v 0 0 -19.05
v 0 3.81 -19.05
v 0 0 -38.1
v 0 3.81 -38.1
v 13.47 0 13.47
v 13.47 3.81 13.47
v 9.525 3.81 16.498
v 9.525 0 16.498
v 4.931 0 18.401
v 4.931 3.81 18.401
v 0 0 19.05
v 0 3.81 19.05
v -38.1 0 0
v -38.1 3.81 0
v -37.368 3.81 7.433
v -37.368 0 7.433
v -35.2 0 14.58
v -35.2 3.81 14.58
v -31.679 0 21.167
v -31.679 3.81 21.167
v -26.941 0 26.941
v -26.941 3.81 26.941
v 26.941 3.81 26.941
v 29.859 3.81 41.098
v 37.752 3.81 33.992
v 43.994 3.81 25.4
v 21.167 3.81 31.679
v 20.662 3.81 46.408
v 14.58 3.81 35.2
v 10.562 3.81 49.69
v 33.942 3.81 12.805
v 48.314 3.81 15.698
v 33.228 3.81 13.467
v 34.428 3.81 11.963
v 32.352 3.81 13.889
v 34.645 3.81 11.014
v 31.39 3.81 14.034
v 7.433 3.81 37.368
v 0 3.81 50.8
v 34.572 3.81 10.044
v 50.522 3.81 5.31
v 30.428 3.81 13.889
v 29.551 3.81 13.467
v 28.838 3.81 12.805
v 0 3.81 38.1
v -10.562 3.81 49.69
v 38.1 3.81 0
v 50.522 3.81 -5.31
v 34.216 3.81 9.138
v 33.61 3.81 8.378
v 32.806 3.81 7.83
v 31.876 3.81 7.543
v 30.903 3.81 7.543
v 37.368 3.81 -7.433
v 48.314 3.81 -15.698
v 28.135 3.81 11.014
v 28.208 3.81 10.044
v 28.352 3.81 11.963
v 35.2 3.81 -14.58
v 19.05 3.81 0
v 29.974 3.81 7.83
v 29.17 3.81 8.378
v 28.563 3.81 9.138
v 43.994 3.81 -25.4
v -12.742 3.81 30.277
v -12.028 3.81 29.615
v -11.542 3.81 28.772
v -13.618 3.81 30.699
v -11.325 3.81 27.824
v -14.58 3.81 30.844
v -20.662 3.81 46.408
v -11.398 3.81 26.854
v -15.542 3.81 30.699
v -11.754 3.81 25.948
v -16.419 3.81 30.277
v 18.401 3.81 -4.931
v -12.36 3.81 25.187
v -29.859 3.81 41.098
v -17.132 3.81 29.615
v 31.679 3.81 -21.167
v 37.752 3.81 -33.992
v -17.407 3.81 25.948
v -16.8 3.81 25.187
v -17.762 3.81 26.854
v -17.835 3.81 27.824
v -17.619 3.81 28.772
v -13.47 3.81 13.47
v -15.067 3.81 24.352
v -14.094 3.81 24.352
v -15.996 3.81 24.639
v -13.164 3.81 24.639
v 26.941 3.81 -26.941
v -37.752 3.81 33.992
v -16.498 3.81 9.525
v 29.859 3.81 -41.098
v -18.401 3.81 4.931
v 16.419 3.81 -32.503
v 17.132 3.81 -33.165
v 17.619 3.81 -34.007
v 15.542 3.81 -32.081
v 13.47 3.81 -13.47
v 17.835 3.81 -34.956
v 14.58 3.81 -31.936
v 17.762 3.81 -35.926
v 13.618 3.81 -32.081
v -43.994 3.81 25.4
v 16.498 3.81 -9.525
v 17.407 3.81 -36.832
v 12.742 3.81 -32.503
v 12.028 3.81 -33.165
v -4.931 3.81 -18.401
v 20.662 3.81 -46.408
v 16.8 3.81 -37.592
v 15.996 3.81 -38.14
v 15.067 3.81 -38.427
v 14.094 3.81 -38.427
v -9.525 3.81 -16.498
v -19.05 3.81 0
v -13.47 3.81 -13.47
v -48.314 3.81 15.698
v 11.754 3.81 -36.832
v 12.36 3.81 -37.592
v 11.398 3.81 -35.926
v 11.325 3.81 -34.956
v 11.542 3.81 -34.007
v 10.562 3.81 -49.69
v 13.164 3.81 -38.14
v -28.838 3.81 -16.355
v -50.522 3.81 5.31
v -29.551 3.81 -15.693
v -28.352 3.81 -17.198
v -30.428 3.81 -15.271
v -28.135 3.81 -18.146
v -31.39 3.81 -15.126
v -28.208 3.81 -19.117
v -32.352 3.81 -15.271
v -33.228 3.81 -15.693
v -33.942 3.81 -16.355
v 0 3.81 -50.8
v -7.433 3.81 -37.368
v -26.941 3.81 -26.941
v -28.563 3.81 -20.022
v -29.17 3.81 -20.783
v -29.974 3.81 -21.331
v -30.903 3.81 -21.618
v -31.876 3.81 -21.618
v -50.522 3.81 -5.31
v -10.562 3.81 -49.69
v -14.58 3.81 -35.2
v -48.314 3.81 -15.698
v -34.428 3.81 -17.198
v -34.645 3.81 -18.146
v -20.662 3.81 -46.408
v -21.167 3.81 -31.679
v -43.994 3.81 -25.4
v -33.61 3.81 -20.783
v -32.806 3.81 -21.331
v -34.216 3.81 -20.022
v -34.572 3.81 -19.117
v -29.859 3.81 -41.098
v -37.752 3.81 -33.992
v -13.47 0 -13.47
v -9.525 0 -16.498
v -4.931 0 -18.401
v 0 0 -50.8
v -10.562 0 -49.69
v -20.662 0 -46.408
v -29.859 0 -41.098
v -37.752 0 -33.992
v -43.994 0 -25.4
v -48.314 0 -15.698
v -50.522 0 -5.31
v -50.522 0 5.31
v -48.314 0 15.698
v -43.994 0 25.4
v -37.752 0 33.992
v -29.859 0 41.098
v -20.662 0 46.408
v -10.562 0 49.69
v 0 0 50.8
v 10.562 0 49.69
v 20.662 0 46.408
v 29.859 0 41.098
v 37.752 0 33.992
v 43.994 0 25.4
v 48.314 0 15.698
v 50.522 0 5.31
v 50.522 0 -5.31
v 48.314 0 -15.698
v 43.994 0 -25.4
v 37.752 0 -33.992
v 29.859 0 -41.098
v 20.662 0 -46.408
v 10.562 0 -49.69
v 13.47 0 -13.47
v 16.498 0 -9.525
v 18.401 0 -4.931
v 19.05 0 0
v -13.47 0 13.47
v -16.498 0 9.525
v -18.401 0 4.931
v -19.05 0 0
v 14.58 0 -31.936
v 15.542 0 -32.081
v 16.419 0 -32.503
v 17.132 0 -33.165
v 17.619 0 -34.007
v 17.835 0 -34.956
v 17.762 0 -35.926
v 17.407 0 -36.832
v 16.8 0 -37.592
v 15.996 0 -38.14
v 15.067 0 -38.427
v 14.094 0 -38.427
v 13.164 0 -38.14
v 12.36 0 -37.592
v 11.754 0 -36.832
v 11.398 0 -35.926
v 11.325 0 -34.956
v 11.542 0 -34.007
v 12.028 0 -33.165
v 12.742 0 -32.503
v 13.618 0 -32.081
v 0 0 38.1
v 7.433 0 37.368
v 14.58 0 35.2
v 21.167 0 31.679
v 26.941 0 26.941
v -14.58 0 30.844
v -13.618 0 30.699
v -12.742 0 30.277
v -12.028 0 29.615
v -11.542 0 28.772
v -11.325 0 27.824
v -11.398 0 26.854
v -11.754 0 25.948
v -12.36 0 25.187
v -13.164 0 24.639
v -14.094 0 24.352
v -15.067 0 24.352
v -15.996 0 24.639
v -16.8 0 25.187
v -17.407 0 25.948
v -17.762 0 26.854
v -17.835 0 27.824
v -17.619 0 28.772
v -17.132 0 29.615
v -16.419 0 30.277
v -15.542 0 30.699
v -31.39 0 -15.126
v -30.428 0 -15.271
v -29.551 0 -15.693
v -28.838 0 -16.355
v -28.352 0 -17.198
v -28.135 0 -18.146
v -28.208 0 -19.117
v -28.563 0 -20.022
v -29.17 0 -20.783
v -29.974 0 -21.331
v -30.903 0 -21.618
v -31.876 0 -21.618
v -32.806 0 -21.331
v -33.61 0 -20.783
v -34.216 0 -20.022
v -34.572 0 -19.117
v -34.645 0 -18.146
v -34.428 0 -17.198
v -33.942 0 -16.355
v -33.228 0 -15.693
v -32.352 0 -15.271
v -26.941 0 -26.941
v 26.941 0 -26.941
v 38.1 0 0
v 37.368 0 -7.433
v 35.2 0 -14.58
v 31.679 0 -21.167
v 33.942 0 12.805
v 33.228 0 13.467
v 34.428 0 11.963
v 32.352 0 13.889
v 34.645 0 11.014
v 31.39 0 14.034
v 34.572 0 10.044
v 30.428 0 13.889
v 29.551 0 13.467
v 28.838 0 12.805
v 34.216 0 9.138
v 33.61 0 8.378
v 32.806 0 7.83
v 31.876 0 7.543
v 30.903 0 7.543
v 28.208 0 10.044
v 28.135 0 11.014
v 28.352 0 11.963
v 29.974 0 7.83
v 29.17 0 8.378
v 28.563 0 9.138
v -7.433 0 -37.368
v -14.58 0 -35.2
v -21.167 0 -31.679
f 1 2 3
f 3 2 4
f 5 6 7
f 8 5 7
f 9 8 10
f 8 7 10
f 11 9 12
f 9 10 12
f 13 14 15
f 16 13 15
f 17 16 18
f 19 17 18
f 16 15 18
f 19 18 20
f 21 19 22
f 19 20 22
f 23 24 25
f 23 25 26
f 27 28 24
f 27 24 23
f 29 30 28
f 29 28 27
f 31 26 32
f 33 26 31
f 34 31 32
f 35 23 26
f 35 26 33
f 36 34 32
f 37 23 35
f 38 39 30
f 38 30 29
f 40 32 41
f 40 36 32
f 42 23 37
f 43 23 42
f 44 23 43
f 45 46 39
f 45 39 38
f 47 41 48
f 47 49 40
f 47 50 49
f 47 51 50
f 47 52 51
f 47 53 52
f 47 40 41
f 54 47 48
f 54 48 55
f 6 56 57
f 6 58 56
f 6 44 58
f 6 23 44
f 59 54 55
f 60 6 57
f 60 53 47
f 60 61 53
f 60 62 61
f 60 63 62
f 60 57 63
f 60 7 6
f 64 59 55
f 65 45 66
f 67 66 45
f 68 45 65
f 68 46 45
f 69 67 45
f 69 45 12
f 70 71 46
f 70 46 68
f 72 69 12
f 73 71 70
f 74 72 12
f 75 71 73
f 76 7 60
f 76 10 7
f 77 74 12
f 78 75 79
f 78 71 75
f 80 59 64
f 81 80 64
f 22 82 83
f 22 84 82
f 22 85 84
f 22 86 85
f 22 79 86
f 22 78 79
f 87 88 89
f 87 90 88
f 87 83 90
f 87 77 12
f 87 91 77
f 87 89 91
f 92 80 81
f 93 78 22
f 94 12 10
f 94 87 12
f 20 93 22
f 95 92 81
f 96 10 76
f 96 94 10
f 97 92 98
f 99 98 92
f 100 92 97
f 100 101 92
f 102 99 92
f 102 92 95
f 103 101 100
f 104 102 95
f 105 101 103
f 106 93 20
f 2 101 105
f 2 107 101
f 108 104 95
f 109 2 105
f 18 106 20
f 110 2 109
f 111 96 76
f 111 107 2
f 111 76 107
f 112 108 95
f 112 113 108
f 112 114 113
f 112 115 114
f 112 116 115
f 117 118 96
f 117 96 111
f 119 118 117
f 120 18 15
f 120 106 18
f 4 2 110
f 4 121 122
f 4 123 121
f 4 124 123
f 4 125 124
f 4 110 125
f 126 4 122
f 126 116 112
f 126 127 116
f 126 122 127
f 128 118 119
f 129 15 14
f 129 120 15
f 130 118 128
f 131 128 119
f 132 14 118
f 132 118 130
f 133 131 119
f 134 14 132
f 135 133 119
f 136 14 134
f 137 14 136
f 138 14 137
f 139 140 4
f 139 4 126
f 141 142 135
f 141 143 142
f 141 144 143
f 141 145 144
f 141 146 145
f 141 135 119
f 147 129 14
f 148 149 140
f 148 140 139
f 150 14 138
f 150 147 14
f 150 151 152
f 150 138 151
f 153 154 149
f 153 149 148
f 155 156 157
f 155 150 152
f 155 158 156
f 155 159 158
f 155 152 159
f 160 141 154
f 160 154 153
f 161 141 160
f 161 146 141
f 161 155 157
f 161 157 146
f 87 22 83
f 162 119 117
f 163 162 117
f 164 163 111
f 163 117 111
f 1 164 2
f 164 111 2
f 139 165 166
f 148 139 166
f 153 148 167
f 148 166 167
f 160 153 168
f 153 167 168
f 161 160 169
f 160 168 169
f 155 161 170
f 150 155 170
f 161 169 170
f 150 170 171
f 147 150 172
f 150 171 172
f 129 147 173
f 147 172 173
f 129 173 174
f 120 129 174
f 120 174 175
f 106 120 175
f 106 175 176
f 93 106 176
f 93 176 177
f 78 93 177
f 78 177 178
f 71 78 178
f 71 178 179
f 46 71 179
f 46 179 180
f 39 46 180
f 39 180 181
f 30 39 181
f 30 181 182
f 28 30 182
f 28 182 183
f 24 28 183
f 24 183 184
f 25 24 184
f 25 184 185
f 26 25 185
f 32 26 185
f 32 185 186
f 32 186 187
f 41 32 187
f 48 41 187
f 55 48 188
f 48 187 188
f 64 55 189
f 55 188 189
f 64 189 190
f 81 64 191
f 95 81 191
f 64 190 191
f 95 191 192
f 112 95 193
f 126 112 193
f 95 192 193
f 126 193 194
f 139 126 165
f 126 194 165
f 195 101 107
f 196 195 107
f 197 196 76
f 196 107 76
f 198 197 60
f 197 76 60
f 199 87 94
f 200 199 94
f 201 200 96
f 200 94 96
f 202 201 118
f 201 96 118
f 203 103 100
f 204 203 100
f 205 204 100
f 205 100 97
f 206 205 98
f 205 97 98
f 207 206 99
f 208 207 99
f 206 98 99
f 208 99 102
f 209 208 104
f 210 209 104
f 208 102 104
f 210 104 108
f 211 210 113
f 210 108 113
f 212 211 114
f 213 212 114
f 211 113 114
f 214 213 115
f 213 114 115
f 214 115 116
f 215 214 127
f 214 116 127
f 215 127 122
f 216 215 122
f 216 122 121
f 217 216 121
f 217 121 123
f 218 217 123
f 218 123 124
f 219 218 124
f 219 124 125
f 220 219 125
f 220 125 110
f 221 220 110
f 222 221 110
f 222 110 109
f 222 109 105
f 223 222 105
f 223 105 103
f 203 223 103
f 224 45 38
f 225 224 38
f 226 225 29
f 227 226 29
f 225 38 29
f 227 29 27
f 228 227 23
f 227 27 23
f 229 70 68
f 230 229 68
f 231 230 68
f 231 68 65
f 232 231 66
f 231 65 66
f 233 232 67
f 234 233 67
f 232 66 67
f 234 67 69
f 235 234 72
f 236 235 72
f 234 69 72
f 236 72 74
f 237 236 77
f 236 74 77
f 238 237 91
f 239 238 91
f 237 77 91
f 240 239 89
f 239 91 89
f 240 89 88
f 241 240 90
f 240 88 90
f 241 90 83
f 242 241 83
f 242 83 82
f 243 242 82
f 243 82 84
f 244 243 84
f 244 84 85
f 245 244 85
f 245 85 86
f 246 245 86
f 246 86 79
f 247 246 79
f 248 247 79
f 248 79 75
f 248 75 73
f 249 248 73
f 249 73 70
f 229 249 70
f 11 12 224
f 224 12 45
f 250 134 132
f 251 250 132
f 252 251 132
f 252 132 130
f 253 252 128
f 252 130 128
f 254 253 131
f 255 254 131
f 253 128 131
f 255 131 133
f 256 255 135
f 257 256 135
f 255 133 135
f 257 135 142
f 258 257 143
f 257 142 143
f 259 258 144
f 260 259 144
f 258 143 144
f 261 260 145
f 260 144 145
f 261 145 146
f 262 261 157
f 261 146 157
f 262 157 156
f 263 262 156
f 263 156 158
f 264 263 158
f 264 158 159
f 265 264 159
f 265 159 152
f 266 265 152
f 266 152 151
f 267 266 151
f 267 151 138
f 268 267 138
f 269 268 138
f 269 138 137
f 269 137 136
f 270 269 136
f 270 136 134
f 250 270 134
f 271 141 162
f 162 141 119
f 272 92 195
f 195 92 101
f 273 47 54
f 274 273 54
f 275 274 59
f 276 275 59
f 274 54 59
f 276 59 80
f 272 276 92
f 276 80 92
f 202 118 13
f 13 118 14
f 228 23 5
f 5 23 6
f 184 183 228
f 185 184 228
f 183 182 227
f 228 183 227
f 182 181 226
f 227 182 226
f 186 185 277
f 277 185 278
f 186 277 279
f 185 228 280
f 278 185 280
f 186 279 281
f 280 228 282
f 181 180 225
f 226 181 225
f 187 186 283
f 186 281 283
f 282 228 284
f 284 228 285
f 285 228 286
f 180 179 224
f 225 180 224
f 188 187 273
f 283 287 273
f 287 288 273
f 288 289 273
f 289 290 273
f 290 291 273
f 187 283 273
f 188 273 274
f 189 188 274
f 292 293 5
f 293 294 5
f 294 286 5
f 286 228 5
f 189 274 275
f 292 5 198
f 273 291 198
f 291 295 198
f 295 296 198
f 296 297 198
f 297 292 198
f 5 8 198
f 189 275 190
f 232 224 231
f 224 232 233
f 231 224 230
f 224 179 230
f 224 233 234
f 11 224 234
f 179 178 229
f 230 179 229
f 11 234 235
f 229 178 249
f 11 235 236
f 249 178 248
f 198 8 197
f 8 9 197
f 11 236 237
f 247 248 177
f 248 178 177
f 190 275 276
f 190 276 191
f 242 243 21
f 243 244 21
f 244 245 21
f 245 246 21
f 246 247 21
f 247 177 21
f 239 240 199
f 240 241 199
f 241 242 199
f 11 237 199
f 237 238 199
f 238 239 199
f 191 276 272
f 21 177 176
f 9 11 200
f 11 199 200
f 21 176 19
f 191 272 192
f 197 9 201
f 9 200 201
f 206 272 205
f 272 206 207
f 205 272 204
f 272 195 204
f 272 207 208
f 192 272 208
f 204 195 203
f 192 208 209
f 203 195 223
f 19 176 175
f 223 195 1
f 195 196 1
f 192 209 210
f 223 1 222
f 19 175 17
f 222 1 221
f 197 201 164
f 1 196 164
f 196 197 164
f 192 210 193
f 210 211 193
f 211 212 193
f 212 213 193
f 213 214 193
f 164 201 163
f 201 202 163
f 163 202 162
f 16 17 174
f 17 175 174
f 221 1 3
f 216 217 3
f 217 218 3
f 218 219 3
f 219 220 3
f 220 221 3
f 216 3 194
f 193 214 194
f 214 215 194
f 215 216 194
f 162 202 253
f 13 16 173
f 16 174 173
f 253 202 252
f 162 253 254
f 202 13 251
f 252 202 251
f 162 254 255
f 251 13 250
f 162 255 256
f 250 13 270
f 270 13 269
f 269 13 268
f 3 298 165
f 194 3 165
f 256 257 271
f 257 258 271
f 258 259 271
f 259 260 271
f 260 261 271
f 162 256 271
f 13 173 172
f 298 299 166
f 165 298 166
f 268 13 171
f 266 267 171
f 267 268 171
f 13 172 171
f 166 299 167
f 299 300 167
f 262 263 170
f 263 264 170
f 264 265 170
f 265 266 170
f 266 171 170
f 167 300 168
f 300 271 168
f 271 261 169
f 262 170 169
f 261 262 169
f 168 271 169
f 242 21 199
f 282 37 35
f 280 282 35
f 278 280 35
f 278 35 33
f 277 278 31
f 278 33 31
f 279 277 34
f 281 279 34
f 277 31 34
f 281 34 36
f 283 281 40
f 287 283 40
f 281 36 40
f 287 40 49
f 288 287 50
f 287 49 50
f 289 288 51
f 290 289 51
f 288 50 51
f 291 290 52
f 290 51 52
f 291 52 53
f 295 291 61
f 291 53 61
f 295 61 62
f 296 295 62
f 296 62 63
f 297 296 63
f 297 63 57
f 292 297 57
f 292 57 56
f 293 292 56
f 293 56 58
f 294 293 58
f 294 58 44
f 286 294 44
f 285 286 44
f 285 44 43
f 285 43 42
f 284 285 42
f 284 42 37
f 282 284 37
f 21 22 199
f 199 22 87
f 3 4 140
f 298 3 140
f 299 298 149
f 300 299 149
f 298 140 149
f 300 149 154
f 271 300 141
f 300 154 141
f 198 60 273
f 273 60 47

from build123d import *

# Parameters (mm, degrees)
SKETCH1_R           = 50.8
BOSS_EXTRUDE1_DEPTH = 19.05
CUT_EXTRUDE2_DEPTH  = 15.24
SKETCH5_R           = 4.064
CUT_EXTRUDE3_DEPTH  = 74.440708058
CUT_EXTRUDE4_DEPTH  = 75.324844433
SKETCH7_R           = 48.26
CUT_EXTRUDE5_DEPTH  = 15.24
SKETCH8_R           = 3.2639
CUT_EXTRUDE6_DEPTH  = 74.440708058
CUT_EXTRUDE7_START  = -15.24
SKETCH9_R           = 50.8
CUT_EXTRUDE7_DEPTH  = 15.24
SKETCH10_R          = 6.215985944
BOSS_EXTRUDE2_DEPTH = 3.81


with BuildPart() as part:
    # Sketch1 → Boss-Extrude1 (new body)
    with BuildSketch(Plane(origin=(0, 0, 0), x_dir=(1, 0, 0), z_dir=(0, 1, 0))):
        with Locations(Location((0, 0, 0), (0, 0, 90))):
            Circle(SKETCH1_R)
    extrude(amount=BOSS_EXTRUDE1_DEPTH)

    # Sketch4 → Cut-Extrude2 (cut)
    with BuildSketch(Plane(origin=(0, 19.05, 0), x_dir=(1, 0, 0), z_dir=(0, 1, 0))):
        Polygon((-3.519527241, 6.096), (3.519527241, 6.096), (7.039054482, 0), (3.519527241, -6.096), (-3.519527241, -6.096), (-7.039054482, 0), align=None)
    extrude(amount=-CUT_EXTRUDE2_DEPTH, mode=Mode.SUBTRACT)

    # Sketch5 → Cut-Extrude3 (cut, through all)
    with BuildSketch(Plane(origin=(0, 3.81, 0), x_dir=(1, 0, 0), z_dir=(0, 1, 0))):
        with Locations(Location((0, 0, 0), (0, 0, 270))):
            Circle(SKETCH5_R)
    extrude(amount=-CUT_EXTRUDE3_DEPTH, mode=Mode.SUBTRACT)

    # Sketch6 → Cut-Extrude4 (cut, through all)
    with BuildSketch(Plane(origin=(0, 19.05, 0), x_dir=(1, 0, 0), z_dir=(0, 1, 0))):
        with BuildLine():
            ThreePointArc((-13.470384182, 13.470384182), (-7.290119387, 17.599905094), (0, 19.05))
            Line((0, 19.05), (0, 38.1))
            ThreePointArc((0, 38.1), (-14.580238773, 35.199810189), (-26.940768363, 26.940768363))
            Line((-26.940768363, 26.940768363), (-13.470384182, 13.470384182))
        make_face()
        with BuildLine():
            Line((26.940768363, 26.940768363), (13.470384182, 13.470384182))
            ThreePointArc((13.470384182, 13.470384182), (17.599905094, 7.290119387), (19.05, 0))
            Line((19.05, 0), (38.1, 0))
            ThreePointArc((38.1, 0), (35.199810189, 14.580238773), (26.940768363, 26.940768363))
        make_face()
        with BuildLine():
            Line((26.940768363, -26.940768363), (13.470384182, -13.470384182))
            ThreePointArc((13.470384182, -13.470384182), (7.290119387, -17.599905094), (0, -19.05))
            Line((0, -19.05), (0, -38.1))
            ThreePointArc((0, -38.1), (14.580238773, -35.199810189), (26.940768363, -26.940768363))
        make_face()
        with BuildLine():
            Line((-26.940768363, -26.940768363), (-13.470384182, -13.470384182))
            ThreePointArc((-13.470384182, -13.470384182), (-17.599905094, -7.290119387), (-19.05, 0))
            Line((-19.05, 0), (-38.1, 0))
            ThreePointArc((-38.1, 0), (-35.199810189, -14.580238773), (-26.940768363, -26.940768363))
        make_face()
    extrude(amount=-CUT_EXTRUDE4_DEPTH, mode=Mode.SUBTRACT)

    # Sketch7 → Cut-Extrude5 (cut)
    with BuildSketch(Plane(origin=(0, 19.05, 0), x_dir=(1, 0, 0), z_dir=(0, 1, 0))):
        with Locations(Location((0, 0, 0), (0, 0, 270))):
            Circle(SKETCH7_R)
        with BuildLine():
            Line((-16.313445375, 2.54), (-40.560547334, 2.54))
            ThreePointArc((-40.560547334, 2.54), (-37.546464201, -15.552254691), (-26.884586844, -30.476689292))
            Line((-26.884586844, -30.476689292), (-9.739296625, -13.331399073))
            ThreePointArc((-9.739296625, -13.331399073), (-15.253251082, -6.318103468), (-16.313445375, 2.54))
        make_face(mode=Mode.SUBTRACT)
        with BuildLine():
            Line((16.313445375, -2.54), (40.560547334, -2.54))
            ThreePointArc((40.560547334, -2.54), (37.546464201, 15.552254691), (26.884586844, 30.476689292))
            Line((26.884586844, 30.476689292), (9.739296625, 13.331399073))
            ThreePointArc((9.739296625, 13.331399073), (15.253251082, 6.318103468), (16.313445375, -2.54))
        make_face(mode=Mode.SUBTRACT)
        Polygon((4.985996925, 8.636), (-4.985996925, 8.636), (-9.971993849, 0), (-4.985996925, -8.636), (4.985996925, -8.636), (9.971993849, 0), align=None, mode=Mode.SUBTRACT)
        with BuildLine():
            ThreePointArc((2.54, 40.560547334), (-15.552254691, 37.546464201), (-30.476689292, 26.884586844))
            Line((-30.476689292, 26.884586844), (-13.331399073, 9.739296625))
            ThreePointArc((-13.331399073, 9.739296625), (-6.318103468, 15.253251082), (2.54, 16.313445375))
            Line((2.54, 16.313445375), (2.54, 40.560547334))
        make_face(mode=Mode.SUBTRACT)
        with BuildLine():
            Line((-2.54, -16.313445375), (-2.54, -40.560547334))
            ThreePointArc((-2.54, -40.560547334), (15.552254691, -37.546464201), (30.476689292, -26.884586844))
            Line((30.476689292, -26.884586844), (13.331399073, -9.739296625))
            ThreePointArc((13.331399073, -9.739296625), (6.318103468, -15.253251082), (-2.54, -16.313445375))
        make_face(mode=Mode.SUBTRACT)
    extrude(amount=-CUT_EXTRUDE5_DEPTH, mode=Mode.SUBTRACT)

    # Sketch8 → Cut-Extrude6 (cut, through all)
    with BuildSketch(Plane(origin=(0, 3.81, 0), x_dir=(1, 0, 0), z_dir=(0, 1, 0))):
        with Locations(Location((14.580238773, 35.199810189, 0), (0, 0, 270))):
            Circle(SKETCH8_R)
        with Locations(Location((31.389810189, -10.770238773, 0), (0, 0, 270))):
            Circle(SKETCH8_R)
        with Locations(Location((-14.580238773, -27.579810189, 0), (0, 0, 270))):
            Circle(SKETCH8_R)
        with Locations(Location((-31.389810189, 18.390238773, 0), (0, 0, 270))):
            Circle(SKETCH8_R)
    extrude(amount=-CUT_EXTRUDE6_DEPTH, mode=Mode.SUBTRACT)

    # Sketch9 → Cut-Extrude7 (cut)
    with BuildSketch(Plane(origin=(0, 19.05, 0), x_dir=(1, 0, 0), z_dir=(0, 1, 0)).offset(CUT_EXTRUDE7_START)):
        with Locations(Location((0, 0, 0), (0, 0, 90))):
            Circle(SKETCH9_R)
    extrude(amount=CUT_EXTRUDE7_DEPTH, mode=Mode.SUBTRACT)

    # Sketch10 → Boss-Extrude2 (add)
    with BuildSketch(Plane(origin=(0, 3.81, 0), x_dir=(1, 0, 0), z_dir=(0, 1, 0))):
        Circle(SKETCH10_R)
    extrude(amount=-BOSS_EXTRUDE2_DEPTH)


solid = part.part
